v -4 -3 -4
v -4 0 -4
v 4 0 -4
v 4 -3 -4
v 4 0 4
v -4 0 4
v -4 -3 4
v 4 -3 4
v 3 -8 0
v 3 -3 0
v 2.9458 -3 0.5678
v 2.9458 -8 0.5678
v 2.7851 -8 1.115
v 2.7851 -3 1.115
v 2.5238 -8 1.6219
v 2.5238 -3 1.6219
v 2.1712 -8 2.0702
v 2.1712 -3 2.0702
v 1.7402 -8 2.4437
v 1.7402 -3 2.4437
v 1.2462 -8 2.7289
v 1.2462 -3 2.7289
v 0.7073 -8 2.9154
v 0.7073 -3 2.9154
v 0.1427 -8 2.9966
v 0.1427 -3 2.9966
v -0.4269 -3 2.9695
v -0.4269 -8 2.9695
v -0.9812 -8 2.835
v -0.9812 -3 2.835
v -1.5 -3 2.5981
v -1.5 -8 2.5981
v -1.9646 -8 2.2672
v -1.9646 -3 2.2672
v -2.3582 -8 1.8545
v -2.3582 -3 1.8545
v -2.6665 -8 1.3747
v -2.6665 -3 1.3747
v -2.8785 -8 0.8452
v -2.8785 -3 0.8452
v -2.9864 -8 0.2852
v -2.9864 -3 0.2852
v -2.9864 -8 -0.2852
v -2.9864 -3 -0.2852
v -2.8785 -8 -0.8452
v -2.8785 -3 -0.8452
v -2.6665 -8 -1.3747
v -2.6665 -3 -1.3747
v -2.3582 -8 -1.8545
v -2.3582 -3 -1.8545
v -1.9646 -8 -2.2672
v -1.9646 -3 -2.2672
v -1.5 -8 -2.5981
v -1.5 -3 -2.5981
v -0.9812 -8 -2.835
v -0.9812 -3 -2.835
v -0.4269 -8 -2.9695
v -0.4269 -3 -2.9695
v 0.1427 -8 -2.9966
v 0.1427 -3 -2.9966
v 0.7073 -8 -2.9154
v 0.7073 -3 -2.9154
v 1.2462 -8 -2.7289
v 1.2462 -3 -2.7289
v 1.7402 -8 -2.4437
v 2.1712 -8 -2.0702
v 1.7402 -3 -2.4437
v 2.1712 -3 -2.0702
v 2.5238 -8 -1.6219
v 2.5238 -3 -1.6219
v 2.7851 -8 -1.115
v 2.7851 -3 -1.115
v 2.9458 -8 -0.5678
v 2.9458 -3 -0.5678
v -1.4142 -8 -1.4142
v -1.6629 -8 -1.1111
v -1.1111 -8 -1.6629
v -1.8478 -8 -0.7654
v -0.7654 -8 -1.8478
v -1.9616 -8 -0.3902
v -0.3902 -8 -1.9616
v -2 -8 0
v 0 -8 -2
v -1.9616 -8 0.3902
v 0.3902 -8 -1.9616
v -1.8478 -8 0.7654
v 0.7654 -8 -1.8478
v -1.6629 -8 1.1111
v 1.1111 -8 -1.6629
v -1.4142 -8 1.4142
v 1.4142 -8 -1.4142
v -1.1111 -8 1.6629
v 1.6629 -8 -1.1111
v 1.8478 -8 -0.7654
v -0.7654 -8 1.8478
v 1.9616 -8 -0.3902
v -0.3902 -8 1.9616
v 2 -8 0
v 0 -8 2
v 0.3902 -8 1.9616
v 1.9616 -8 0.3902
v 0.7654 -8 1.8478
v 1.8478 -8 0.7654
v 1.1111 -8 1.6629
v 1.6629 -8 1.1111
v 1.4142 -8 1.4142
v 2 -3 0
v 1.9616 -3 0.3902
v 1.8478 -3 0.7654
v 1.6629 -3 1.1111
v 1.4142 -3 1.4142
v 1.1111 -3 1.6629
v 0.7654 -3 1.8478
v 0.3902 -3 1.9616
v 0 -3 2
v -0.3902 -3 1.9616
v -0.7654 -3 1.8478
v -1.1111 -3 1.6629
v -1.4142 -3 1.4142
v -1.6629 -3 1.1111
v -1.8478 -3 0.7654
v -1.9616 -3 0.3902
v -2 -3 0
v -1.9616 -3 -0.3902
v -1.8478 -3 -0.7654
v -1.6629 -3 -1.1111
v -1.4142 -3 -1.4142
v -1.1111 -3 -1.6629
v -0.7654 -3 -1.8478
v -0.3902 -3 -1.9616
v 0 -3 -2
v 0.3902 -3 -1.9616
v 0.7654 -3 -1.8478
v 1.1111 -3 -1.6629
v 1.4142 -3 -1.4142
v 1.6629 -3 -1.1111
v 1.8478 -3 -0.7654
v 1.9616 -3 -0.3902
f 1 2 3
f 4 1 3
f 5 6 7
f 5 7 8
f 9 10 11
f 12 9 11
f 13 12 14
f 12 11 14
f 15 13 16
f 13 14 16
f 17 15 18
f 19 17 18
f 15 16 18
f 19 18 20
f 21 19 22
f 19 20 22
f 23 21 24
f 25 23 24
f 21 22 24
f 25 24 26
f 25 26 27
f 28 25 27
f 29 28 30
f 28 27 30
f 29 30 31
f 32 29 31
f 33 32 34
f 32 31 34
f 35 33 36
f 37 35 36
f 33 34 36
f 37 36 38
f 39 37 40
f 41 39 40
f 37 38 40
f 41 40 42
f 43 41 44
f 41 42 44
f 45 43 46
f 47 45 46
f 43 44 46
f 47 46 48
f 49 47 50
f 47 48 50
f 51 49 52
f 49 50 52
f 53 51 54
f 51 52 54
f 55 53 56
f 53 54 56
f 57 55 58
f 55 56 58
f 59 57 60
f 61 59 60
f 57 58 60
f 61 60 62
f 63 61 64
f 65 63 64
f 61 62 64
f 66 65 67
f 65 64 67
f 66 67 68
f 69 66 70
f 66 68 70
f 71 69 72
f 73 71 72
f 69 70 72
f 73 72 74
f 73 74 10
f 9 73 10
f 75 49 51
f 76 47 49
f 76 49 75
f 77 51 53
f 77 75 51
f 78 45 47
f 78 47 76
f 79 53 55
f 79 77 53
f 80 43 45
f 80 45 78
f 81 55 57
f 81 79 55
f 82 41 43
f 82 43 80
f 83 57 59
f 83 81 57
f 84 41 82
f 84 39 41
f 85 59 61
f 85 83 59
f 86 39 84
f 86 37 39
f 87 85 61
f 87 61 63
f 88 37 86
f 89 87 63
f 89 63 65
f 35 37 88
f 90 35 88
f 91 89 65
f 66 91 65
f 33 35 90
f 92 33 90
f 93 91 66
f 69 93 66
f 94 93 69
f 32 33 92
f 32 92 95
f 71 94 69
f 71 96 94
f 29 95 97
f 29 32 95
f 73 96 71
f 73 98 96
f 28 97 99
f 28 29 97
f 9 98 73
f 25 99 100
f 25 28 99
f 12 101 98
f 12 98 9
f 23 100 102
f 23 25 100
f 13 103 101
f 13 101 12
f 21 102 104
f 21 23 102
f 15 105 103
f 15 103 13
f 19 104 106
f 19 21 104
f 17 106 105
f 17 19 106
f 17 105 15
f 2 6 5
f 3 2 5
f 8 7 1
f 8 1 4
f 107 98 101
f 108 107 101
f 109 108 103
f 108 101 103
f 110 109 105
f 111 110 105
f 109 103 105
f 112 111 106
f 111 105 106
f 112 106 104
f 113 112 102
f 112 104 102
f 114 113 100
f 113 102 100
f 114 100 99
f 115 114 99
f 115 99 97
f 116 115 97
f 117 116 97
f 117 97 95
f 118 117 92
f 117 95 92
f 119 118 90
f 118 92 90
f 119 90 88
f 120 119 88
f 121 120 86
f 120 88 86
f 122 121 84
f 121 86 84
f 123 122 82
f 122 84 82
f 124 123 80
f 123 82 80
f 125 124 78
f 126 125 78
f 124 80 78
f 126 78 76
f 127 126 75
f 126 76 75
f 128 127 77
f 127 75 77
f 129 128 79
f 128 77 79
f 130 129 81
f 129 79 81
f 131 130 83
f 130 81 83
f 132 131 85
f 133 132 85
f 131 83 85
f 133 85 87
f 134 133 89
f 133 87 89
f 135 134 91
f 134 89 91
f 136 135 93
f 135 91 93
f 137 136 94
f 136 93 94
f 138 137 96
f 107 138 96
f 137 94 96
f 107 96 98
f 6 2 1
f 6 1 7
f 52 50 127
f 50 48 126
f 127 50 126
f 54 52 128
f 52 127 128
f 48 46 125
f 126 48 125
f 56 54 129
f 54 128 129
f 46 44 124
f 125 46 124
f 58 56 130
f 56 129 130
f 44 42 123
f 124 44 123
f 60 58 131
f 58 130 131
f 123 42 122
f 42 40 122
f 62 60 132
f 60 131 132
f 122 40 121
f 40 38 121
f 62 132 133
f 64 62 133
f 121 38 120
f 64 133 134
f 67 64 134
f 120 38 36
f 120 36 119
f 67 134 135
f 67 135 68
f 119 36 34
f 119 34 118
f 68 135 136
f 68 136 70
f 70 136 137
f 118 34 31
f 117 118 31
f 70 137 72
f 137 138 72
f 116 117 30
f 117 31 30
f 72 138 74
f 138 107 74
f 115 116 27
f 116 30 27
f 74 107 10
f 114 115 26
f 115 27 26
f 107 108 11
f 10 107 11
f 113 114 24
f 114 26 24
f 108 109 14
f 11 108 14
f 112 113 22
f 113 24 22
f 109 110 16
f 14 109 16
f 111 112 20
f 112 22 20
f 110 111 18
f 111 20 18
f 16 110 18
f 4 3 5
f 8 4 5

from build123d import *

# Parameters (mm, degrees)
F0_W     = 8
F0_H     = 8
F1_DEPTH = 3
F2_R     = 3
F3_DEPTH = 5
F4_R     = 2
F5_DEPTH = 5


with BuildPart() as f1:
    # F0 (on Front) → F1 (new body)
    with BuildSketch(Plane.XZ):
        Rectangle(F0_W, F0_H)
    extrude(amount=F1_DEPTH)


with BuildPart() as f3:
    # F2 (on face) → F3 (new body)
    with BuildSketch(Plane.XZ.offset(3)):
        Circle(F2_R)
    extrude(amount=F3_DEPTH)

    # F4 (on face) → F5 (cut)
    with BuildSketch(Plane.XZ.offset(8)):
        Circle(F4_R)
    extrude(amount=-F5_DEPTH, mode=Mode.SUBTRACT)


solid = Compound([f1.part, f3.part])
